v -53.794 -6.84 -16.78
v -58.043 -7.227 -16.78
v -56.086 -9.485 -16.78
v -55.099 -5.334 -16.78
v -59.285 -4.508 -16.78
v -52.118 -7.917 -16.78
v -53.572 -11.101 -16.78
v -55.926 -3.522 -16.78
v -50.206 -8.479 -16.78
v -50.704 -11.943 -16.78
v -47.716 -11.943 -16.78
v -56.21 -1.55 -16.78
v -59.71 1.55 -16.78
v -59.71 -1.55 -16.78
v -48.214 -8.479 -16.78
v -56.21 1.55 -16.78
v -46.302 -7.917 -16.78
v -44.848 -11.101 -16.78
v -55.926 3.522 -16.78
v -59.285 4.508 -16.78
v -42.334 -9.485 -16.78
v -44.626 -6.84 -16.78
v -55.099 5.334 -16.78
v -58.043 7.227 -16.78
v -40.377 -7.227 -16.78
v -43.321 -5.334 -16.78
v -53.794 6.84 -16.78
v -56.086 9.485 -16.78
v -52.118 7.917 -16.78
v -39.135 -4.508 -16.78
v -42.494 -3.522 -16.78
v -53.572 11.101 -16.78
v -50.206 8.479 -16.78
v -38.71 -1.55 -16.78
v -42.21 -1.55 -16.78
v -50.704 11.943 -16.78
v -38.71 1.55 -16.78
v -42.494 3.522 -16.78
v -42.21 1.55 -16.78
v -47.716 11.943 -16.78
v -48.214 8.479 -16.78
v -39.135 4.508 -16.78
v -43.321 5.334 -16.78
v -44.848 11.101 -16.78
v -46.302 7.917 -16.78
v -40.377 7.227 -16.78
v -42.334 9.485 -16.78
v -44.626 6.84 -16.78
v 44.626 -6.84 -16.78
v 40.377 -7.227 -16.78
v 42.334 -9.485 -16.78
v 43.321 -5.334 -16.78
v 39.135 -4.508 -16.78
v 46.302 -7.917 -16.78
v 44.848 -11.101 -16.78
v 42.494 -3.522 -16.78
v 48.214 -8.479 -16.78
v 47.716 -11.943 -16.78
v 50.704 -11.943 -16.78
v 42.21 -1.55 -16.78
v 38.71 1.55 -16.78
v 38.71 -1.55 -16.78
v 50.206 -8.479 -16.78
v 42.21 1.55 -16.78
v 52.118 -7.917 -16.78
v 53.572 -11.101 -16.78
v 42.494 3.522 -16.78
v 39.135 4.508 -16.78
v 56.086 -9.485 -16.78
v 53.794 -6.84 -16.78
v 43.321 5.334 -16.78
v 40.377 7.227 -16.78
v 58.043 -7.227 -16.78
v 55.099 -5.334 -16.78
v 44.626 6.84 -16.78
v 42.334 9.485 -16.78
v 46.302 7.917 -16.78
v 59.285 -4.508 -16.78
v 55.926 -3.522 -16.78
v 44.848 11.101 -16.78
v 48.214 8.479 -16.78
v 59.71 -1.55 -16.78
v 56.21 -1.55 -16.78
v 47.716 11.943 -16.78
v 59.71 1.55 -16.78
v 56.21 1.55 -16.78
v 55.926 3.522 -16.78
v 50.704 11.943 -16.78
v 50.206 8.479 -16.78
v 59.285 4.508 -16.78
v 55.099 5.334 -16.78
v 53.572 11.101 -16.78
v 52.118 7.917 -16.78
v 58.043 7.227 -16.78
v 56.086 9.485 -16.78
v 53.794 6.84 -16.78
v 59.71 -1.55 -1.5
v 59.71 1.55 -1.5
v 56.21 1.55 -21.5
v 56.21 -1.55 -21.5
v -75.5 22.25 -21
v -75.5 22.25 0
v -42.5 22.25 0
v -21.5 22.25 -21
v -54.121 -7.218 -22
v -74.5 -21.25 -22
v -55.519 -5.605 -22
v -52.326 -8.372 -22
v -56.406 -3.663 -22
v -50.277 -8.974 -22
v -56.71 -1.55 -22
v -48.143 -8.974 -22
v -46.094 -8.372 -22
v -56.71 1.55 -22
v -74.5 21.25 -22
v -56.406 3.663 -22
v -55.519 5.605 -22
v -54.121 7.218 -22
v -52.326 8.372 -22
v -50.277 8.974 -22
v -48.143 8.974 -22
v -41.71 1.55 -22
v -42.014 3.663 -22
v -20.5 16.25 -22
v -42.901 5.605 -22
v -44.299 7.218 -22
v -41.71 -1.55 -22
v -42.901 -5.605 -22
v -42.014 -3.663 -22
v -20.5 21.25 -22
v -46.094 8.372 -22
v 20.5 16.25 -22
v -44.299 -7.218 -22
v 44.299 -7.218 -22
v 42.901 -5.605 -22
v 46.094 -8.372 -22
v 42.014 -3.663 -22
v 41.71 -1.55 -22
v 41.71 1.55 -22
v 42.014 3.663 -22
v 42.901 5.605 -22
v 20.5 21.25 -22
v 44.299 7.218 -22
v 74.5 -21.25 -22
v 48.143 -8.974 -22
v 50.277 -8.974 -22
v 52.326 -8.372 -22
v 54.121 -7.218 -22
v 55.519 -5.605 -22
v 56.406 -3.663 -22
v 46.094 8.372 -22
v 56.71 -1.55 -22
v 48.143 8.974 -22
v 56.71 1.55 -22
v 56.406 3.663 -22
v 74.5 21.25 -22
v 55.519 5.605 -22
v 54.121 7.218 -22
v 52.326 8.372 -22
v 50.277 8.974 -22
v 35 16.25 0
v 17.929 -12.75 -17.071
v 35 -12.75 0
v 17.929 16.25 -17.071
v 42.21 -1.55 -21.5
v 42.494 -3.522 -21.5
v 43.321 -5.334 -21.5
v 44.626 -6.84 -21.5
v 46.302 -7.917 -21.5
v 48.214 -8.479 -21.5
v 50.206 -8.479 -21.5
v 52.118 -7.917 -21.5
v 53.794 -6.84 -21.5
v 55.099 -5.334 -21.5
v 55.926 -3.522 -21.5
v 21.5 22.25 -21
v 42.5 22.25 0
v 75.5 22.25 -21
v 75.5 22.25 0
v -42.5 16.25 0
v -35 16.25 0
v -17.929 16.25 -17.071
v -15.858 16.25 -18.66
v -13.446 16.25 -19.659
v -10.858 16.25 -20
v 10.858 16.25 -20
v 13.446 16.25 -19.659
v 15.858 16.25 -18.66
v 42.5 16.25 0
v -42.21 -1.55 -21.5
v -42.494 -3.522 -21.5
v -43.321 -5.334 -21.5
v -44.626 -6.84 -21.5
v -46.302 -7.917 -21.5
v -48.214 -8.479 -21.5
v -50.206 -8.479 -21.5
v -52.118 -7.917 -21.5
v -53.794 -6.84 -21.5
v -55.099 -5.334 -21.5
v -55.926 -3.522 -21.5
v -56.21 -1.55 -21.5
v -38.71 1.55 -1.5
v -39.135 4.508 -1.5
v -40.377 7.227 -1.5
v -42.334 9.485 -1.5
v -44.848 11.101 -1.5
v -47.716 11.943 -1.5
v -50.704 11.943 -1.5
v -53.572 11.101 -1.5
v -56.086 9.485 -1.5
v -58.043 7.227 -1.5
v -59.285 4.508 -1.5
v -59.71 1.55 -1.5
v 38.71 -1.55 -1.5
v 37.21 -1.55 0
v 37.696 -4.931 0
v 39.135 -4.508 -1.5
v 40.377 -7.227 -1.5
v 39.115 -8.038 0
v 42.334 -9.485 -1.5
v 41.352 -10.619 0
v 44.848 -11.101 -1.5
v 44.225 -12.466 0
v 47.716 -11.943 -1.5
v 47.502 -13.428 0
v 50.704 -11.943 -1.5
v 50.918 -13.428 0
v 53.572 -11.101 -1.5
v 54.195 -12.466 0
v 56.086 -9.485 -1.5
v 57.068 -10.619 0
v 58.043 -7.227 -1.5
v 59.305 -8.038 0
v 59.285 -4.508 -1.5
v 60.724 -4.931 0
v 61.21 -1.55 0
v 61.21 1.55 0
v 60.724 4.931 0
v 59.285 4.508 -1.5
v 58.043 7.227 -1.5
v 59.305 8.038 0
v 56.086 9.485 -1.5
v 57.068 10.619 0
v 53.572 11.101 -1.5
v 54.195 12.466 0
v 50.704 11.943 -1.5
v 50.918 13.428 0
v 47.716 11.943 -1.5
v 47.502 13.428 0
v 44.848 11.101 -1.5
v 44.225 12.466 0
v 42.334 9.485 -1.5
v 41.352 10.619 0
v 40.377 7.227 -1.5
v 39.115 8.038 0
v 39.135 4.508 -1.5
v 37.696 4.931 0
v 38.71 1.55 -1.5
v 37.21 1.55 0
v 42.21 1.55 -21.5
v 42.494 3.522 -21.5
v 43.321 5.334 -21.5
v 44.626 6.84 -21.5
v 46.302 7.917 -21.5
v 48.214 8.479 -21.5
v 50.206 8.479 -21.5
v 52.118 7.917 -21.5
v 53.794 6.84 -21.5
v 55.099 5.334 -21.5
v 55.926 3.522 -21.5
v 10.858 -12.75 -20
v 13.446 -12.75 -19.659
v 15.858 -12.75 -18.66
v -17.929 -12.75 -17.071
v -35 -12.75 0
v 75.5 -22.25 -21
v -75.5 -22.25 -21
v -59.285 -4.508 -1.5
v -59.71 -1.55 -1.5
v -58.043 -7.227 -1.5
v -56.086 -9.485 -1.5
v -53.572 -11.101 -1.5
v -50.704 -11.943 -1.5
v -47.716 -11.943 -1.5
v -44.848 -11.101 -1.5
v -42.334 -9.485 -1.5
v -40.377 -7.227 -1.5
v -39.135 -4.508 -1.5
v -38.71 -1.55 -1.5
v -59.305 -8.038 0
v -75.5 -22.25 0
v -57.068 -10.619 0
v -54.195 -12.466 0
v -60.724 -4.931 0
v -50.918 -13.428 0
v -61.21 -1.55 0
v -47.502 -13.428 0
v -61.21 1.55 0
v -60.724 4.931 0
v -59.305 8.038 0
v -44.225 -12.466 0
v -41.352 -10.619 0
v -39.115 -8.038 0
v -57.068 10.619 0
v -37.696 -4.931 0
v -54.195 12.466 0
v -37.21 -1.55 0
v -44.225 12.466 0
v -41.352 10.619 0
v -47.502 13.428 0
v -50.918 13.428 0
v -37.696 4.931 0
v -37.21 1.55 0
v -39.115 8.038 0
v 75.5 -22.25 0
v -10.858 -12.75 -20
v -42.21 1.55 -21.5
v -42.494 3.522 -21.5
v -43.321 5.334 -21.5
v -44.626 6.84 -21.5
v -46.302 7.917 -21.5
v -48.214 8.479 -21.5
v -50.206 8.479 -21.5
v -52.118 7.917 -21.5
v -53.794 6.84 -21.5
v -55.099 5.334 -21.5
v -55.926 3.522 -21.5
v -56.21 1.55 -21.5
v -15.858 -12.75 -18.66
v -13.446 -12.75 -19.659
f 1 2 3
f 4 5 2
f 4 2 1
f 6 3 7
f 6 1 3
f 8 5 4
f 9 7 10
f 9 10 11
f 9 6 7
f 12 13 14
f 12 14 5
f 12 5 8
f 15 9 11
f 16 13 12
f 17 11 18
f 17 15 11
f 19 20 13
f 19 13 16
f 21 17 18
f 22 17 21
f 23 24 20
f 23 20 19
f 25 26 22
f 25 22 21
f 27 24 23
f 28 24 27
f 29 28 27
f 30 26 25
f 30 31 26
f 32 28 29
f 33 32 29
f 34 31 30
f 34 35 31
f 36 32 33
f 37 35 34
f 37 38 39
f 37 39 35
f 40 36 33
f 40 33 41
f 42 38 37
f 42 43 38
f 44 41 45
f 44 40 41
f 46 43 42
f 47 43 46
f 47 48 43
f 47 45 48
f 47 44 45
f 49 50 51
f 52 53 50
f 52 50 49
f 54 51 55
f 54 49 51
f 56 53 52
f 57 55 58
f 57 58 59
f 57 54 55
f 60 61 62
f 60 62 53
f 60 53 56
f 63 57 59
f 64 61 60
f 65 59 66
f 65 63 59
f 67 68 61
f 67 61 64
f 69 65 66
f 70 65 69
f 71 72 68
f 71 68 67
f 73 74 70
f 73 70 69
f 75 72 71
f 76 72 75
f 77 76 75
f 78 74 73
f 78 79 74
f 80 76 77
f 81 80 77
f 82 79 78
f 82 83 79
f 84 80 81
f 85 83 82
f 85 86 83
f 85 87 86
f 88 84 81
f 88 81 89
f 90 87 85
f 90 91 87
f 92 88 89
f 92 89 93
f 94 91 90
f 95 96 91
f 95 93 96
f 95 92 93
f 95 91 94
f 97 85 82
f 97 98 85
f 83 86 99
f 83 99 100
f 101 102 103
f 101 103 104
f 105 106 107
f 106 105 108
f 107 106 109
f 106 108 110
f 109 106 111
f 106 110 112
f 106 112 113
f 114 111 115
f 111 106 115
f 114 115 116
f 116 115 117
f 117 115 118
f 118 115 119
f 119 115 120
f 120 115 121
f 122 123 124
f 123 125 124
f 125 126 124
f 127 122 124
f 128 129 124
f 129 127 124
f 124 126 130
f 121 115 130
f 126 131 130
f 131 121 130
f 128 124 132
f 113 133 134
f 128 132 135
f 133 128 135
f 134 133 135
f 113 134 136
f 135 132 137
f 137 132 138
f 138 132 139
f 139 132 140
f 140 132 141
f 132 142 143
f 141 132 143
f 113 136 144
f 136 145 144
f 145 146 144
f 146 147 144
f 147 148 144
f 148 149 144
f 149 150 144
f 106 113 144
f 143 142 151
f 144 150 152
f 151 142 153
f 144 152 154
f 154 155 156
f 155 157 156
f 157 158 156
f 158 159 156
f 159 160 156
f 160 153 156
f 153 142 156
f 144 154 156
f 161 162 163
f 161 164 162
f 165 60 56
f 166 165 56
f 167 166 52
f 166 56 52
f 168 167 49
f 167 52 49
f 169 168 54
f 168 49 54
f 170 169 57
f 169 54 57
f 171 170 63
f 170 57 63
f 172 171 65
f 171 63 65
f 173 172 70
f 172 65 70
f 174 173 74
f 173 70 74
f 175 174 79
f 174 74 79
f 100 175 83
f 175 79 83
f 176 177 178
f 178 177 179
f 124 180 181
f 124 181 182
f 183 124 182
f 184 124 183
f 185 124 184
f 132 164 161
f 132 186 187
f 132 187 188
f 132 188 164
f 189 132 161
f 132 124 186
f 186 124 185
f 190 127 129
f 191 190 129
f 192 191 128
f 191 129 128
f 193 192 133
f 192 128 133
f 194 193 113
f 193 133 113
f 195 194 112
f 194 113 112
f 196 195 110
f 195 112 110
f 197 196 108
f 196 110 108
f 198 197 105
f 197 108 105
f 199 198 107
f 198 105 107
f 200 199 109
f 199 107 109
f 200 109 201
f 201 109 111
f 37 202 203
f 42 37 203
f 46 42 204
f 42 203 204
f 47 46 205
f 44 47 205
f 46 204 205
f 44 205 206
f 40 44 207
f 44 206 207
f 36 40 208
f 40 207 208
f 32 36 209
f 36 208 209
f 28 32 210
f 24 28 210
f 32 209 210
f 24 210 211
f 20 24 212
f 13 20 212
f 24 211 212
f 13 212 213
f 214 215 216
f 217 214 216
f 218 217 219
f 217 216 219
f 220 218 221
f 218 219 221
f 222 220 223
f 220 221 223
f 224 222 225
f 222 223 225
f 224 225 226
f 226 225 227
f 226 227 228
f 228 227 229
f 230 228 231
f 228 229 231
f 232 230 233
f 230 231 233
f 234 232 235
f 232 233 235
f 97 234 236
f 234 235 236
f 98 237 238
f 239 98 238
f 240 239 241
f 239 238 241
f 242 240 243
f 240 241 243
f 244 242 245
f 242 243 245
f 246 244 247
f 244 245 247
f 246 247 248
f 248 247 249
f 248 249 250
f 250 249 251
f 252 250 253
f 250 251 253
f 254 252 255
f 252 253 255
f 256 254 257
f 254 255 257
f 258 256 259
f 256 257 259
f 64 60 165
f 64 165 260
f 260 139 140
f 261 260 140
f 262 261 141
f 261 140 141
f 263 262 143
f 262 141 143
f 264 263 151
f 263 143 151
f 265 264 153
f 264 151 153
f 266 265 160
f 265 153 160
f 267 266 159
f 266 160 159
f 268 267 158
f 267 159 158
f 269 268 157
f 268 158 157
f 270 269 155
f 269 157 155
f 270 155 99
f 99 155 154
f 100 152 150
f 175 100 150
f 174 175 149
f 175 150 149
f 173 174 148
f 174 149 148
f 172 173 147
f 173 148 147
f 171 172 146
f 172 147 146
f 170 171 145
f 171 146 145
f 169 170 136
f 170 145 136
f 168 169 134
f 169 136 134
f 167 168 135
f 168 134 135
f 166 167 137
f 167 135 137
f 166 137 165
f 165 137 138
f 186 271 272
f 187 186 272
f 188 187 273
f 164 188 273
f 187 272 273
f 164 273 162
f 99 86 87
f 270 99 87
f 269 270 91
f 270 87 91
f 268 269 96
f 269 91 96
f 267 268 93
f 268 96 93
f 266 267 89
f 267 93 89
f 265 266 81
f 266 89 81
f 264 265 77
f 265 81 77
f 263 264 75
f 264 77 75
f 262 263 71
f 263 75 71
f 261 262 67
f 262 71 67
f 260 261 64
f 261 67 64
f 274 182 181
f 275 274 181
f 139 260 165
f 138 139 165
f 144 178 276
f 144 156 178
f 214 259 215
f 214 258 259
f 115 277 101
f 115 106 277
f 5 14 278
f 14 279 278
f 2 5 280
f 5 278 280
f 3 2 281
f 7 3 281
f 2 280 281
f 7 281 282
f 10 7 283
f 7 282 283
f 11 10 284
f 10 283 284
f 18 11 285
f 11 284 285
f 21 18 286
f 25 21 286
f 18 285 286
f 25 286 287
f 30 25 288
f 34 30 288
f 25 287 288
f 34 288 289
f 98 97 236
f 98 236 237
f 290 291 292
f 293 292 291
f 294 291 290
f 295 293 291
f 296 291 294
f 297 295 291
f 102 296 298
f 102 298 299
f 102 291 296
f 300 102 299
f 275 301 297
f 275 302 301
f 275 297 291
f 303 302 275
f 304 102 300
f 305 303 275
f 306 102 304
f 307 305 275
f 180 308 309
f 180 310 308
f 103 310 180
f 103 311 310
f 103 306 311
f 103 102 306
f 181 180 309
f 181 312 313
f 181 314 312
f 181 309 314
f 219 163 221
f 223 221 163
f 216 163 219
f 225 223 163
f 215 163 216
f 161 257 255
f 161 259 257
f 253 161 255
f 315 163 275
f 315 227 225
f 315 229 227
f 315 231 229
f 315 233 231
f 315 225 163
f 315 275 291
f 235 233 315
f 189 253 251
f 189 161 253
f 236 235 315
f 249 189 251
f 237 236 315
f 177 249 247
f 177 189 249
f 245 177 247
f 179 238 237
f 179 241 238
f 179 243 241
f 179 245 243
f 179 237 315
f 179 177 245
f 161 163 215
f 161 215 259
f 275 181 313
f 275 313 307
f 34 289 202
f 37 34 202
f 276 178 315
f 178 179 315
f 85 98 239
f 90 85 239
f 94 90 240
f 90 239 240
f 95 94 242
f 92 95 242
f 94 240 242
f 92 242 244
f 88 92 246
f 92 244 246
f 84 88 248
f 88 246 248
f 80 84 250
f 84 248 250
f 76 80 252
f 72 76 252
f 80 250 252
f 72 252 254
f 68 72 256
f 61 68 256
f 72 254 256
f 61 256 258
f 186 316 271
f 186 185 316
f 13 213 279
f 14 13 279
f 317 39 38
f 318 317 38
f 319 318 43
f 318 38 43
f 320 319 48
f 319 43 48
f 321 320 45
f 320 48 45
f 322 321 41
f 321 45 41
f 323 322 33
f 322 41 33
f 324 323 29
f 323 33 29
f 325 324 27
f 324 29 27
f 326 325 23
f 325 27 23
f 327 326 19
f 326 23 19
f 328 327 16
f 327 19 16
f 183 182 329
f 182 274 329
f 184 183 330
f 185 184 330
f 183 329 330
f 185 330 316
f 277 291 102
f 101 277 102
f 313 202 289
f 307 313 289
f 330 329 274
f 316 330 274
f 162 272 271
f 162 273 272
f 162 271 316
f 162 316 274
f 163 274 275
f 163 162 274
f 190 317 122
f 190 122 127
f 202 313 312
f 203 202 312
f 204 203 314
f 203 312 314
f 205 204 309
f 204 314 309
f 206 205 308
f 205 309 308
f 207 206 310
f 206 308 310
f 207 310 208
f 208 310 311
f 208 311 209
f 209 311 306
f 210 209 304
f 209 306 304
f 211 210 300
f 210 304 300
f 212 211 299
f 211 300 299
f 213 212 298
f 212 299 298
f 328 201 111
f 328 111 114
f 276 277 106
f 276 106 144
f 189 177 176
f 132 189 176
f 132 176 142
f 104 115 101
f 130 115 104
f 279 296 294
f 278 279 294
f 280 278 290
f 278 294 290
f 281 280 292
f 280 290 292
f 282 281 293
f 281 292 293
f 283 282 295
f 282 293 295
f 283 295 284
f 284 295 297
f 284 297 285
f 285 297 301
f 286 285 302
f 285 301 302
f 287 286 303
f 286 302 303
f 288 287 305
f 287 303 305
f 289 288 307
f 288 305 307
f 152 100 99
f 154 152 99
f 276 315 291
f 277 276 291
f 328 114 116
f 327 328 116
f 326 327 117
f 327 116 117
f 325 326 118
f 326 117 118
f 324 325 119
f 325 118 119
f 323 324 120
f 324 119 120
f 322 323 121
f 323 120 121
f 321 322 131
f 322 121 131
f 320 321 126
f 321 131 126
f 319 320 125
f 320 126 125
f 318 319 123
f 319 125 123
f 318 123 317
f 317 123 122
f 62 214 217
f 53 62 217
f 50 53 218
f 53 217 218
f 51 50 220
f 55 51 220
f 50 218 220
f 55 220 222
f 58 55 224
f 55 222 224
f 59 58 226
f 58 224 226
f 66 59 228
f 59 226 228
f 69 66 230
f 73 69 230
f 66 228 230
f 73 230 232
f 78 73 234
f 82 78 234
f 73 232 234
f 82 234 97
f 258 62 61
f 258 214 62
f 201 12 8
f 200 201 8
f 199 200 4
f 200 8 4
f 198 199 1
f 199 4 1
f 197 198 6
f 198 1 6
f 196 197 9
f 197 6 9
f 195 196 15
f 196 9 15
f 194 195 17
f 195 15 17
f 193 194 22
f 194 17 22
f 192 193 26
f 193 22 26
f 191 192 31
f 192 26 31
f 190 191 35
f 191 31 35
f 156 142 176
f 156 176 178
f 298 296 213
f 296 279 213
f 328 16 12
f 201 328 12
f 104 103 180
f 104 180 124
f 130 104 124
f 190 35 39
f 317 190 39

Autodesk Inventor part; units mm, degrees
ref_plane "YZ Plane" through (0, 0, 0) normal (1, 0, 0) x (0, 1, 0)
ref_plane "XZ Plane" through (0, 0, 0) normal (0, 1, 0) x (-1, 0, 0)
ref_plane "XY Plane" through (0, 0, 0) normal (0, 0, 1) x (1, 0, 0)
sketch "Sketch1" plane through (0, 0, 0) normal (0, 0, 1) x (1, 0, 0)
  line L0 (-105.7, 0) -> (105.7, 0) construction
  line L1 (0, -31.15) -> (0, 31.15) construction
  line L2 (-75.5, 22.25) -> (75.5, 22.25)
  line L3 (75.5, 22.25) -> (75.5, -22.25)
  line L4 (75.5, -22.25) -> (-75.5, -22.25)
  line L5 (-75.5, -22.25) -> (-75.5, 22.25)
  line L6 (-49.21, 1.55) -> (-49.21, -1.55) construction
  line L7 (-56.21, 1.55) -> (-56.21, -1.55)
  line L8 (-42.21, -1.55) -> (-42.21, 1.55)
  arc A0 (-42.21, 1.55) -> (-56.21, 1.55) centre (-49.21, 1.55) ccw
  arc A1 (-56.21, -1.55) -> (-42.21, -1.55) centre (-49.21, -1.55) ccw
  line L9 (49.21, 1.55) -> (49.21, -1.55) construction
  line L10 (56.21, 1.55) -> (56.21, -1.55)
  line L11 (42.21, -1.55) -> (42.21, 1.55)
  arc A2 (56.21, 1.55) -> (42.21, 1.55) centre (49.21, 1.55) ccw
  arc A3 (42.21, -1.55) -> (56.21, -1.55) centre (49.21, -1.55) ccw
  line L12 (-49.21, 1.55) -> (-49.21, -1.55) construction
  line L13 (-59.71, 1.55) -> (-59.71, -1.55)
  line L14 (-38.71, -1.55) -> (-38.71, 1.55)
  arc A4 (-38.71, 1.55) -> (-59.71, 1.55) centre (-49.21, 1.55) ccw
  arc A5 (-59.71, -1.55) -> (-38.71, -1.55) centre (-49.21, -1.55) ccw
  line L15 (59.71, 1.55) -> (59.71, -1.55)
  line L16 (38.71, -1.55) -> (38.71, 1.55)
  arc A6 (59.71, 1.55) -> (38.71, 1.55) centre (49.21, 1.55) ccw
  arc A7 (38.71, -1.55) -> (59.71, -1.55) centre (49.21, -1.55) ccw
  point P0 (0, 0)
  point P1 (-49.21, 0)
  point P2 (49.21, 0)
  point P3 (-49.21, 0)
  dimension "d0" = 44.5
  dimension "d1" = 151
  dimension "d26" = 14
  dimension "d27" = 20.7
  dimension "d28" = 98.42
  dimension "d29" = 21
  dimension "d30" = 1.55
extrude "Extrusion1" add sketch "Sketch1" against normal blind 22 contours L2 L3 L4 L5 | A0 L8 A1 L7 | L10 A3 L11 A2 | A4 L14 A5 L13 | L15 A7 L16 A6
extrude "Extrusion2" cut sketch "Sketch1" against normal through all contours A0 L8 A1 L7 | L10 A3 L11 A2
extrude "Extrusion3" cut sketch "Sketch1" against normal blind 16.78 contours L10 A3 L11 A2 | A4 L14 A5 L13 | L15 A7 L16 A6
chamfer "Chamfer3" distance 1 angle 45 4 edges at (0, 22.25, -22) (-75.5, 0, -22) (0, -22.25, -22) (75.5, 0, -22)
chamfer "Chamfer4" distance 1.5 angle 45 8 edges at (-49.21, 12.05, 0) (-38.71, 0, 0) (-49.21, -12.05, 0) (-59.71, 0, 0) (49.21, 12.05, 0) (59.71, 0, 0) (49.21, -12.05, 0) (38.71, 0, 0)
chamfer "Chamfer5" distance 0.5 angle 45 8 edges at (-49.21, 8.55, -22) (-56.21, 0, -22) (-49.21, -8.55, -22) (-42.21, 0, -22) (49.21, -8.55, -22) (56.21, 0, -22) (49.21, 8.55, -22) (42.21, 0, -22)
sketch "Sketch2" plane through (-75.5, 22.25, 0) normal (0, 1, 0) x (1, 0, 0)
  line L0 (0, 21) -> (151, 21) construction
  line L1 (0, 0) -> (0, 21) construction
  line L2 (151, 0) -> (0, 0) projected
  line L3 (151, 0) -> (151, 21) construction
  line L4 (75.5, 42.335) -> (75.5, -100.0102) construction
  circle A0 centre (75.5, -32.1751) radius 47.5 construction
  line L5 (150, 22) -> (1, 22) projected
  line L6 (62.5, 22) -> (40.5, 0)
  line L7 (88.5, 22) -> (110.5, 0)
  line L8 (14.29, 0) -> (38.29, 0) projected
  line L9 (33, 0) -> (55, 22)
  line L10 (118, 0) -> (96, 22)
  circle A1 centre (75.5, -28.2107) radius 50 construction
  line L11 (60.5, 20) -> (90.5, 20)
  dimension "d54" = 95
  dimension "d57" = 45
  dimension "d59" = 70
  dimension "d60" = 45
  dimension "d61" = 85
  dimension "d62" = 100
  dimension "d68" = 2
extrude "Extrusion6" cut sketch "Sketch2" against normal blind 35 contours L2 L6 L11 L7
extrude "Extrusion7" cut sketch "Sketch2" against normal blind 6 contours L2 L7 L5 L10 | L2 L9 L5 L6 | L11 L6 L5 L7
fillet "Fillet1" radius 10 2 edges at (-15, 1.75, -20) (15, 1.75, -20)
equation "\"d0\" = jawH"
equation "\"d1\" = jawW"
equation "\"d4\" = jawT"
equation "\"jawH\" = 44.5"
equation "\"jawW\" = 151"
equation "\"jawT\" = 22"
properties part number "JawDualSided" material "Aluminum 6061"
